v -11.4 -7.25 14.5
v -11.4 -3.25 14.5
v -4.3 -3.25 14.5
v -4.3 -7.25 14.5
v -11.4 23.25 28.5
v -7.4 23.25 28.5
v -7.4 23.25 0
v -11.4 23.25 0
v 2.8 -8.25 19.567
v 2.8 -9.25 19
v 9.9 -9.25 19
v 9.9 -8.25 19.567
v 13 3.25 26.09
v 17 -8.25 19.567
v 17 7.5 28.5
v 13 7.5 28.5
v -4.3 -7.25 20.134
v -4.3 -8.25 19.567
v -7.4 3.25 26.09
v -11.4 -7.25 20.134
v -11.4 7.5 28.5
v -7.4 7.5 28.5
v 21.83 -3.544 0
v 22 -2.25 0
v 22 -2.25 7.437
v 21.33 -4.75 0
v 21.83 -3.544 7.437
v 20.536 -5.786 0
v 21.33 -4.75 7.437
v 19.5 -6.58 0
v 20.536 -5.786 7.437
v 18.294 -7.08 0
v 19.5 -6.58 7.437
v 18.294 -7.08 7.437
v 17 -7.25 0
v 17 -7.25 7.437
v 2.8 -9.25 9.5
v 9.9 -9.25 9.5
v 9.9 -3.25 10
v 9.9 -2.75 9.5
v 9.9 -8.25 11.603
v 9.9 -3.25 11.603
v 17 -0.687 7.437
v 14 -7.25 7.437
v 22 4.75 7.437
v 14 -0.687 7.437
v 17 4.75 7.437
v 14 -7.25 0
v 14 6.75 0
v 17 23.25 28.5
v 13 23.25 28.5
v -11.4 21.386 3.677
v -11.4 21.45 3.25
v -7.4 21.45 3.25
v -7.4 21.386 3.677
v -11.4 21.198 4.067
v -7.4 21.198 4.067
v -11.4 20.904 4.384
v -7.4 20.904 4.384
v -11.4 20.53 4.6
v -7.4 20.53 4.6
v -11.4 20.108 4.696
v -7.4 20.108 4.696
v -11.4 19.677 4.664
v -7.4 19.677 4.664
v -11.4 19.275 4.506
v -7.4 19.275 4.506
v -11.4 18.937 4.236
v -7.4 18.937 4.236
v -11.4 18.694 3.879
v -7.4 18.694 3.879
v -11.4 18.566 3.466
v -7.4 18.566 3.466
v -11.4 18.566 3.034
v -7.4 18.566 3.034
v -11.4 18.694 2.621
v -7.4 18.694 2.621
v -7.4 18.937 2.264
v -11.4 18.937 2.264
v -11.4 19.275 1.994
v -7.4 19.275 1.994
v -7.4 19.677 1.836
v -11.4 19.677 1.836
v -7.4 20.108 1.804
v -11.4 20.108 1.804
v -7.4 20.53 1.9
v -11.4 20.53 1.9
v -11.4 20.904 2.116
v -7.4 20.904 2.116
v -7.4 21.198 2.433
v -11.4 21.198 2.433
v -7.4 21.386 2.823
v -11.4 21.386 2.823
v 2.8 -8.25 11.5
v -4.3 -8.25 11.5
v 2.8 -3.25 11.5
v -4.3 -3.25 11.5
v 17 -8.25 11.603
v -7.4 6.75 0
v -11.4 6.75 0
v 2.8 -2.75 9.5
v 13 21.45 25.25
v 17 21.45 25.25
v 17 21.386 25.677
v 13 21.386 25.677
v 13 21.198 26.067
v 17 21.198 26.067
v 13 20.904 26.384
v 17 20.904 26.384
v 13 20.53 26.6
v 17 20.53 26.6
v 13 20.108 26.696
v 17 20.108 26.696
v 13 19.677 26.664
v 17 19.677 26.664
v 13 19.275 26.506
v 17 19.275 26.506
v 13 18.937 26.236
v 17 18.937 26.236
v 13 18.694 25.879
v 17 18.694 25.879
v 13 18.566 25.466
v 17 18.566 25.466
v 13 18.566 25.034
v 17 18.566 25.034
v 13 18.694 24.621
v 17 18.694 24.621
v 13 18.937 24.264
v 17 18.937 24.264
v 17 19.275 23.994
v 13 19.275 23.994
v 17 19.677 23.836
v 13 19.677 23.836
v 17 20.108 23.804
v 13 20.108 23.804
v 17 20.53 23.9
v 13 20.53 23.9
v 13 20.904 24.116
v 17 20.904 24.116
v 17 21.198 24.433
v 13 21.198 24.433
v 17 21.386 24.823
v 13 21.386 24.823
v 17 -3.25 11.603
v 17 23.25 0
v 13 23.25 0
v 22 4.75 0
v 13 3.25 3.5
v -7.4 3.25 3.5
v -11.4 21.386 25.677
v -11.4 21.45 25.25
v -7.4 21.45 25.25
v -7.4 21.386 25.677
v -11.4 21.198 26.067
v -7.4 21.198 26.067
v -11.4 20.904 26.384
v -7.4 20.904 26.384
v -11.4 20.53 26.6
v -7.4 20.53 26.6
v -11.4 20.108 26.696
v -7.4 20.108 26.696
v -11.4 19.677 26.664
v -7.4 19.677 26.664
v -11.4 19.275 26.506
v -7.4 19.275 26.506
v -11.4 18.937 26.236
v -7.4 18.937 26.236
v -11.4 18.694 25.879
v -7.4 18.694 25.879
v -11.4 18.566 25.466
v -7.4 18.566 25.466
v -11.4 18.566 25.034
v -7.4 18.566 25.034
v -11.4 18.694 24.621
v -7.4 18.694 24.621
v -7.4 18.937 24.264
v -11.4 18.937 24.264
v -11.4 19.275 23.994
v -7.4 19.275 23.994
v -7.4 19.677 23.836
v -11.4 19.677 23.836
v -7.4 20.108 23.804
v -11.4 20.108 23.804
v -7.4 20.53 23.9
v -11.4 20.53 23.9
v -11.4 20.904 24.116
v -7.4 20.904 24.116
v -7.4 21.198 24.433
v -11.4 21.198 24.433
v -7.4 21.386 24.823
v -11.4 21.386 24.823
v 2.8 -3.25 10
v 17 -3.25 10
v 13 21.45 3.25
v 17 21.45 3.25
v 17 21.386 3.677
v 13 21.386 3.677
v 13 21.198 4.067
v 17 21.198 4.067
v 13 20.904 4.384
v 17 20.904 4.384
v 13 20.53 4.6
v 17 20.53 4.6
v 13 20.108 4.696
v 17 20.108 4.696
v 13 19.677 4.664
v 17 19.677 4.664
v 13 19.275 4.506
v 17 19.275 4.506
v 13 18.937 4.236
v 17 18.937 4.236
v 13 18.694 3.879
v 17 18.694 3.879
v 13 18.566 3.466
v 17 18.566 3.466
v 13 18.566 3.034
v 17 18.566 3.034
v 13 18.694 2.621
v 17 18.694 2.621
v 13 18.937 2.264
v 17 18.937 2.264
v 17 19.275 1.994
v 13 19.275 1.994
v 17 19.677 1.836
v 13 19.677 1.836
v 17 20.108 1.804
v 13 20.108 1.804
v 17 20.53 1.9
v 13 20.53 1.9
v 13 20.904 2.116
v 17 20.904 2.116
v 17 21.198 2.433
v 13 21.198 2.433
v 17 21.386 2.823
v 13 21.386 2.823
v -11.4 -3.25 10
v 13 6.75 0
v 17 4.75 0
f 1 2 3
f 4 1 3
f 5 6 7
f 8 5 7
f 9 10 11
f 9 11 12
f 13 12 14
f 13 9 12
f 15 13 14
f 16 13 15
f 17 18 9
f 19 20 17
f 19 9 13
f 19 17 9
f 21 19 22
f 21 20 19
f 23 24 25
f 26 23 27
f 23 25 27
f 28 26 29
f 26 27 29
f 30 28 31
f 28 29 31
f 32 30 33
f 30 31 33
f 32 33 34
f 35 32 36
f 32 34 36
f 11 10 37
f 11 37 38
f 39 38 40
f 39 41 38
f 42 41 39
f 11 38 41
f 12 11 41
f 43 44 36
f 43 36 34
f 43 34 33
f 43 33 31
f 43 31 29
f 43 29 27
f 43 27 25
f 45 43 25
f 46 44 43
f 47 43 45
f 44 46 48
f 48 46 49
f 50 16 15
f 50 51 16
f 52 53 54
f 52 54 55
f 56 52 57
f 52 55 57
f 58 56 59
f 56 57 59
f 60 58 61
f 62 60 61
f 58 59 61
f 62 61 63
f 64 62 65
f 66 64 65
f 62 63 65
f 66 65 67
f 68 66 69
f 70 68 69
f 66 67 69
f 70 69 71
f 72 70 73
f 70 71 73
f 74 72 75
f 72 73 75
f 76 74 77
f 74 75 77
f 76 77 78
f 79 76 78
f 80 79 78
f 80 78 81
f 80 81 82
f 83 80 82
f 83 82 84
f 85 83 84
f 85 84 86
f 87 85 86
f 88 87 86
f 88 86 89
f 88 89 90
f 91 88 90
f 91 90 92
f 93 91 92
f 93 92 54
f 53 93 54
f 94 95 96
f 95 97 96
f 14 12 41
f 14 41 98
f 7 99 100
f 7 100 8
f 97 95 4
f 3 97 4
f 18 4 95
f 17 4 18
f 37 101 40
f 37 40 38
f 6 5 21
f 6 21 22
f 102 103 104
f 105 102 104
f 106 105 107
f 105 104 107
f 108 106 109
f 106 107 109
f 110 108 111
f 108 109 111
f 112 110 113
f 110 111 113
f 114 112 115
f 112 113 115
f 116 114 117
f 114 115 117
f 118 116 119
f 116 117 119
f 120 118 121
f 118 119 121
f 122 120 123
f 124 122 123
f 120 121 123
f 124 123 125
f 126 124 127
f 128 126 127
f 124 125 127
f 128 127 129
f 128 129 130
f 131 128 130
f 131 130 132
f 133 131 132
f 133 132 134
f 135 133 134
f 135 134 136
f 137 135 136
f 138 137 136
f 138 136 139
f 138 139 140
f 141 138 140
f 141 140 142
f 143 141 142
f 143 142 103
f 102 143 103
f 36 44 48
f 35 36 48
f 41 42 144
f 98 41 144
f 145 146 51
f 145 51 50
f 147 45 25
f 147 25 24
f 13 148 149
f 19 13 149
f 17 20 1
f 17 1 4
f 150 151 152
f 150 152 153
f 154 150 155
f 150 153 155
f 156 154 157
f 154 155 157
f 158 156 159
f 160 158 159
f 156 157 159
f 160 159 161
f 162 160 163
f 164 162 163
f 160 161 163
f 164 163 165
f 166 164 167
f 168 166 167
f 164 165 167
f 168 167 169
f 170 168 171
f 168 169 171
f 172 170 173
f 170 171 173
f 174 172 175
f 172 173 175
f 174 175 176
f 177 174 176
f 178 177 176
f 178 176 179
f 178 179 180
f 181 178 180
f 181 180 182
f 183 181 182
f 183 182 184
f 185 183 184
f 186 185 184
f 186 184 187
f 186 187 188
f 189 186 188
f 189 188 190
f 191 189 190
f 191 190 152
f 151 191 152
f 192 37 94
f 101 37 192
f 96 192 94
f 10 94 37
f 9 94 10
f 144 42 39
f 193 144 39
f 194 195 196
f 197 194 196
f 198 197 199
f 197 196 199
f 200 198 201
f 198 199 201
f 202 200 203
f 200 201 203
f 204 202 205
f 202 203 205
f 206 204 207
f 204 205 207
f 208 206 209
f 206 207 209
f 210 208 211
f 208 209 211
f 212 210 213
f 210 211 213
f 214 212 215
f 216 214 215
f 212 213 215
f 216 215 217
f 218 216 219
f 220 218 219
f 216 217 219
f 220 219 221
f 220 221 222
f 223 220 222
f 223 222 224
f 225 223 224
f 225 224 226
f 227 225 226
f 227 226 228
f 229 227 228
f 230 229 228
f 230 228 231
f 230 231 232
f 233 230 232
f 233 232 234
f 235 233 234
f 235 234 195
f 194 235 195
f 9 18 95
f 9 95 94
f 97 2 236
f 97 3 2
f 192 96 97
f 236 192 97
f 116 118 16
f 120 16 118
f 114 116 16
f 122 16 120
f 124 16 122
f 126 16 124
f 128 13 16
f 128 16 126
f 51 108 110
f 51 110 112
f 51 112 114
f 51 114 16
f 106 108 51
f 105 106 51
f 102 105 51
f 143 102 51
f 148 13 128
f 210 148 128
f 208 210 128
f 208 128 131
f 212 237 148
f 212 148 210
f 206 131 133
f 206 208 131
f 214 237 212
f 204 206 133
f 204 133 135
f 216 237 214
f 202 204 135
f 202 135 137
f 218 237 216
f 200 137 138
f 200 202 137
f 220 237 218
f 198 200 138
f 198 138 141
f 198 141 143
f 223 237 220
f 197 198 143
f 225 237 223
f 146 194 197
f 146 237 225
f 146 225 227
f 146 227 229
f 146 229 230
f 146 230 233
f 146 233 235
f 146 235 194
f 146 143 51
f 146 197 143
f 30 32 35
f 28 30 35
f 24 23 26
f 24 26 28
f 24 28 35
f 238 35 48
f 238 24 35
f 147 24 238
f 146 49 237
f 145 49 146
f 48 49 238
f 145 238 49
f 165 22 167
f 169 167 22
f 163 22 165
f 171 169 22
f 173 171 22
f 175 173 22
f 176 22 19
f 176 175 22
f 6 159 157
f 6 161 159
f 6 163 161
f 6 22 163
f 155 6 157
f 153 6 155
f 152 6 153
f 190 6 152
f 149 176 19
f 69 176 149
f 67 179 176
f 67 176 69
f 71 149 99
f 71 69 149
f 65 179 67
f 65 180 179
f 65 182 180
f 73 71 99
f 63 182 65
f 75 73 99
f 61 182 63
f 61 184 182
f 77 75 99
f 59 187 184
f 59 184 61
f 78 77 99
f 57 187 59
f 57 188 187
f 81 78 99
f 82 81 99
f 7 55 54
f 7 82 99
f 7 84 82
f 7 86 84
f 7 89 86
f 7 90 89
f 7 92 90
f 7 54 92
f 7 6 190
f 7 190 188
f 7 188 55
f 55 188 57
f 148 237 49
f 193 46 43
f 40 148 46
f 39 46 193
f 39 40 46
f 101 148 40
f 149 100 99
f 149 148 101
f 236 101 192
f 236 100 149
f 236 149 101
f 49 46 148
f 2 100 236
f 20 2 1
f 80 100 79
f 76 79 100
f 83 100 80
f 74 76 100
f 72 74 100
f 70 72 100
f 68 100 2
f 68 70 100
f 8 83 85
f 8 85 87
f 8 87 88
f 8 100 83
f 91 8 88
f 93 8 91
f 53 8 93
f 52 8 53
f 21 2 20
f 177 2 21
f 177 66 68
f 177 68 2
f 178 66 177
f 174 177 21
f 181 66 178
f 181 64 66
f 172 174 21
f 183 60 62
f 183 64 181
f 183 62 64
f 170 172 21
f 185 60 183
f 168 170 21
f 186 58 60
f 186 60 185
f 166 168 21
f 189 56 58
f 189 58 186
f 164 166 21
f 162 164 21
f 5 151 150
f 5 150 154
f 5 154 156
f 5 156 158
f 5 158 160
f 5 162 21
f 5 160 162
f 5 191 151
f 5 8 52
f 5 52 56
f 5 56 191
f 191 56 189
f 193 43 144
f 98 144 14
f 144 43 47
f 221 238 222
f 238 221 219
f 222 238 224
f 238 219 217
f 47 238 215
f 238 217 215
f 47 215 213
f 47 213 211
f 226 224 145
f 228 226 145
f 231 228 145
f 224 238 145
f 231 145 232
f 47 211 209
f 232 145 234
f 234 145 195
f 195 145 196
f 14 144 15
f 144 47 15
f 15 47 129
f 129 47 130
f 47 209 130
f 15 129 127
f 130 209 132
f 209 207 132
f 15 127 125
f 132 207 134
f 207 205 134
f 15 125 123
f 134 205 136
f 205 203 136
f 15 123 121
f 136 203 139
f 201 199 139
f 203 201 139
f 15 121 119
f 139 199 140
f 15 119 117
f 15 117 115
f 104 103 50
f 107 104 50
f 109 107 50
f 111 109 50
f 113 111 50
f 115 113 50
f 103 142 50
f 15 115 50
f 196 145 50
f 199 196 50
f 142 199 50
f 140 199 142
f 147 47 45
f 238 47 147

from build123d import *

# Parameters (mm, degrees)
SKETCH1_W                = 34
SKETCH1_H                = 46.5
BOSS_EXTRUDE1_DEPTH      = 28.5
SKETCH2_R                = 1.45
CUT_EXTRUDE1_DEPTH       = 51.088047476
SKETCH3_W                = 28.5
SKETCH3_H                = 20
CUT_EXTRUDE2_DEPTH       = 51.088047476
SKETCH4_W                = 26
SKETCH4_H                = 20
CUT_EXTRUDE3_DEPTH       = 41.519285532
BOSS_EXTRUDE2_DEPTH      = 5
BOSS_EXTRUDE2_DEPTH_BACK = 3
SKETCH5_W                = 7.437082776
SKETCH5_H                = 15
BOSS_EXTRUDE3_START      = 5.6
SKETCH6_W                = 28.5
SKETCH6_H                = 20
SKETCH6_R                = 1.45
BOSS_EXTRUDE3_DEPTH      = 5.6
SKETCH7_W                = 5.6
SKETCH7_H                = 26.5
CUT_EXTRUDE4_DEPTH       = 43.858050586
SKETCH9_W                = 7.1
SKETCH9_H                = 14
SKETCH9_H_2              = 16.896851025
BOSS_EXTRUDE4_DEPTH      = 4
SKETCH10_W               = 7.1
SKETCH10_H               = 17
BOSS_EXTRUDE5_DEPTH      = 1
SKETCH11_W               = 7.1
SKETCH11_H               = 19
BOSS_EXTRUDE6_DEPTH      = 2
SKETCH12_W               = 7.1
SKETCH12_H               = 16.896851025
BOSS_EXTRUDE7_DEPTH      = 1
CUT_EXTRUDE5_DEPTH       = 47.469048839
CUT_EXTRUDE5_DEPTH_BACK  = 47.469048839
SKETCH13_W               = 7.437082776
SKETCH13_H               = 3
FILLET1_R                = 5
CHAMFER1_START           = -11.4
CHAMFER1_DEPTH           = 25.4
CHAMFER1_START_2         = 9.9
CHAMFER1_2_DEPTH         = 12.1
CHAMFER1_3_DEPTH         = 14.2


with BuildPart() as part:
    # Sketch1 → Boss-Extrude1 (new body)
    with BuildSketch(Plane.XY):
        Rectangle(SKETCH1_W, SKETCH1_H)
    extrude(amount=BOSS_EXTRUDE1_DEPTH)

    # Sketch2 → Cut-Extrude1 (cut, through all)
    with BuildSketch(Plane(origin=(17, 0, 0), x_dir=(0, 0, -1), z_dir=(1, 0, 0))):
        with Locations(Location((-25.25, 20, 0), (0, 0, 90))):
            Circle(SKETCH2_R)
        with Locations(Location((-3.25, 20, 0), (0, 0, 90))):
            Circle(SKETCH2_R)
        with Locations(Location((-3.25, -20, 0), (0, 0, 90))):
            Circle(SKETCH2_R)
        with Locations(Location((-25.25, -20, 0), (0, 0, 90))):
            Circle(SKETCH2_R)
    extrude(amount=-CUT_EXTRUDE1_DEPTH, mode=Mode.SUBTRACT)

    # Sketch3 → Cut-Extrude2 (cut, through all)
    with BuildSketch(Plane(origin=(17, 0, 0), x_dir=(0, 0, -1), z_dir=(1, 0, 0))):
        with Locations((-14.25, -13.25)):
            Rectangle(SKETCH3_W, SKETCH3_H)
    extrude(amount=-CUT_EXTRUDE2_DEPTH, mode=Mode.SUBTRACT)

    # Sketch4 → Cut-Extrude3 (cut, through all)
    with BuildSketch(Plane(origin=(0, 0, 0), x_dir=(-1, 0, 0), z_dir=(0, 0, -1))):
        with Locations((0, 13.25)):
            Rectangle(SKETCH4_W, SKETCH4_H)
    extrude(amount=-CUT_EXTRUDE3_DEPTH, mode=Mode.SUBTRACT)

    # Sketch5 → Boss-Extrude2 (add, two sides: drawn at the far end of the back side and taken through both)
    with BuildSketch(Plane(origin=(17, 0, 0), x_dir=(0, 0, -1), z_dir=(1, 0, 0)).offset(-BOSS_EXTRUDE2_DEPTH_BACK)):
        with Locations((-3.718541388, -2.75)):
            Rectangle(SKETCH5_W, SKETCH5_H)
    extrude(amount=BOSS_EXTRUDE2_DEPTH + BOSS_EXTRUDE2_DEPTH_BACK)

    # Sketch6 → Boss-Extrude3 (add)
    with BuildSketch(Plane(origin=(-13, 0, 0), x_dir=(0, 0, -1), z_dir=(1, 0, 0)).offset(BOSS_EXTRUDE3_START)):
        with Locations((-14.25, 13.25)):
            Rectangle(SKETCH6_W, SKETCH6_H)
        with Locations(Location((-25.25, 20, 0), (0, 0, 90))):
            Circle(SKETCH6_R, mode=Mode.SUBTRACT)
        with Locations(Location((-3.25, 20, 0), (0, 0, 90))):
            Circle(SKETCH6_R, mode=Mode.SUBTRACT)
    extrude(amount=-BOSS_EXTRUDE3_DEPTH)

    # Sketch7 → Cut-Extrude4 (cut, through all)
    with BuildSketch(Plane(origin=(0, 0, 0), x_dir=(-1, 0, 0), z_dir=(0, 0, -1))):
        with Locations((14.2, 10)):
            Rectangle(SKETCH7_W, SKETCH7_H)
    extrude(amount=-CUT_EXTRUDE4_DEPTH, mode=Mode.SUBTRACT)

    # Sketch9 → Boss-Extrude4 (add)
    with BuildSketch(Plane.XZ.offset(3.25)):
        with Locations((-7.85, 21.5)):
            Rectangle(SKETCH9_W, SKETCH9_H)
        Polygon((2.8, 28.5), (-4.3, 28.5), (-4.3, 14.5), (-4.3, 11.5), (2.8, 11.5), align=None)
        with Locations((13.45, 20.051574487)):
            Rectangle(SKETCH9_W, SKETCH9_H_2)
        Polygon((9.9, 28.5), (2.8, 28.5), (2.8, 11.5), (2.8, 9.5), (9.9, 9.5), (9.9, 11.603148975), align=None)
    extrude(amount=BOSS_EXTRUDE4_DEPTH)

    # Sketch10 → Boss-Extrude5 (add)
    with BuildSketch(Plane.XZ.offset(7.25)):
        with Locations((-0.75, 20)):
            Rectangle(SKETCH10_W, SKETCH10_H)
    extrude(amount=BOSS_EXTRUDE5_DEPTH)

    # Sketch11 → Boss-Extrude6 (add)
    with BuildSketch(Plane.XZ.offset(7.25)):
        with Locations((6.35, 19)):
            Rectangle(SKETCH11_W, SKETCH11_H)
    extrude(amount=BOSS_EXTRUDE6_DEPTH)

    # Sketch12 → Boss-Extrude7 (add)
    with BuildSketch(Plane.XZ.offset(7.25)):
        with Locations((13.45, 20.051574487)):
            Rectangle(SKETCH12_W, SKETCH12_H)
    extrude(amount=BOSS_EXTRUDE7_DEPTH)

    # Sketch13 → Cut-Extrude5 (cut, two sides: drawn at the far end of the back side and taken through both)
    with BuildSketch(Plane(origin=(17, 0, 0), x_dir=(0, 0, -1), z_dir=(1, 0, 0)).offset(-CUT_EXTRUDE5_DEPTH_BACK)):
        Polygon((-19, -9.25), (-28.5, 7.5), (-28.5, -9.25), align=None)
        with Locations((-3.718541388, -8.75)):
            Rectangle(SKETCH13_W, SKETCH13_H)
    extrude(amount=CUT_EXTRUDE5_DEPTH + CUT_EXTRUDE5_DEPTH_BACK, mode=Mode.SUBTRACT)

    # Fillet1
    fillet1_edges = [part.edges().sort_by_distance(p)[0] for p in [
        (22, -7.25, 3.718541388),
    ]]
    fillet(fillet1_edges, radius=FILLET1_R)

    # Chamfer1: read off the stored shape, not the designer's step
    # Chamfer1 outline → Chamfer1 (cut)
    with BuildSketch(Plane.YZ.offset(CHAMFER1_START)):
        Polygon((-2.75, 9.5), (-3.25, 9.5), (-3.25, 0), (6.75, 0), align=None)
    extrude(amount=CHAMFER1_DEPTH, mode=Mode.SUBTRACT)

    # Chamfer1 2 outline → Chamfer1 2 (cut)
    with BuildSketch(Plane.YZ.offset(CHAMFER1_START_2)):
        Polygon((-3.25, 7.437082776), (-0.687082776, 7.437082776), (-3.25, 10), align=None)
    extrude(amount=CHAMFER1_2_DEPTH, mode=Mode.SUBTRACT)

    # Chamfer1 3 outline → Chamfer1 3 (cut)
    with BuildSketch(Plane.YZ.offset(CHAMFER1_START)):
        Polygon((-3.25, 9.5), (-2.75, 9.5), (-3.25, 10), align=None)
    extrude(amount=CHAMFER1_3_DEPTH, mode=Mode.SUBTRACT)


solid = part.part
